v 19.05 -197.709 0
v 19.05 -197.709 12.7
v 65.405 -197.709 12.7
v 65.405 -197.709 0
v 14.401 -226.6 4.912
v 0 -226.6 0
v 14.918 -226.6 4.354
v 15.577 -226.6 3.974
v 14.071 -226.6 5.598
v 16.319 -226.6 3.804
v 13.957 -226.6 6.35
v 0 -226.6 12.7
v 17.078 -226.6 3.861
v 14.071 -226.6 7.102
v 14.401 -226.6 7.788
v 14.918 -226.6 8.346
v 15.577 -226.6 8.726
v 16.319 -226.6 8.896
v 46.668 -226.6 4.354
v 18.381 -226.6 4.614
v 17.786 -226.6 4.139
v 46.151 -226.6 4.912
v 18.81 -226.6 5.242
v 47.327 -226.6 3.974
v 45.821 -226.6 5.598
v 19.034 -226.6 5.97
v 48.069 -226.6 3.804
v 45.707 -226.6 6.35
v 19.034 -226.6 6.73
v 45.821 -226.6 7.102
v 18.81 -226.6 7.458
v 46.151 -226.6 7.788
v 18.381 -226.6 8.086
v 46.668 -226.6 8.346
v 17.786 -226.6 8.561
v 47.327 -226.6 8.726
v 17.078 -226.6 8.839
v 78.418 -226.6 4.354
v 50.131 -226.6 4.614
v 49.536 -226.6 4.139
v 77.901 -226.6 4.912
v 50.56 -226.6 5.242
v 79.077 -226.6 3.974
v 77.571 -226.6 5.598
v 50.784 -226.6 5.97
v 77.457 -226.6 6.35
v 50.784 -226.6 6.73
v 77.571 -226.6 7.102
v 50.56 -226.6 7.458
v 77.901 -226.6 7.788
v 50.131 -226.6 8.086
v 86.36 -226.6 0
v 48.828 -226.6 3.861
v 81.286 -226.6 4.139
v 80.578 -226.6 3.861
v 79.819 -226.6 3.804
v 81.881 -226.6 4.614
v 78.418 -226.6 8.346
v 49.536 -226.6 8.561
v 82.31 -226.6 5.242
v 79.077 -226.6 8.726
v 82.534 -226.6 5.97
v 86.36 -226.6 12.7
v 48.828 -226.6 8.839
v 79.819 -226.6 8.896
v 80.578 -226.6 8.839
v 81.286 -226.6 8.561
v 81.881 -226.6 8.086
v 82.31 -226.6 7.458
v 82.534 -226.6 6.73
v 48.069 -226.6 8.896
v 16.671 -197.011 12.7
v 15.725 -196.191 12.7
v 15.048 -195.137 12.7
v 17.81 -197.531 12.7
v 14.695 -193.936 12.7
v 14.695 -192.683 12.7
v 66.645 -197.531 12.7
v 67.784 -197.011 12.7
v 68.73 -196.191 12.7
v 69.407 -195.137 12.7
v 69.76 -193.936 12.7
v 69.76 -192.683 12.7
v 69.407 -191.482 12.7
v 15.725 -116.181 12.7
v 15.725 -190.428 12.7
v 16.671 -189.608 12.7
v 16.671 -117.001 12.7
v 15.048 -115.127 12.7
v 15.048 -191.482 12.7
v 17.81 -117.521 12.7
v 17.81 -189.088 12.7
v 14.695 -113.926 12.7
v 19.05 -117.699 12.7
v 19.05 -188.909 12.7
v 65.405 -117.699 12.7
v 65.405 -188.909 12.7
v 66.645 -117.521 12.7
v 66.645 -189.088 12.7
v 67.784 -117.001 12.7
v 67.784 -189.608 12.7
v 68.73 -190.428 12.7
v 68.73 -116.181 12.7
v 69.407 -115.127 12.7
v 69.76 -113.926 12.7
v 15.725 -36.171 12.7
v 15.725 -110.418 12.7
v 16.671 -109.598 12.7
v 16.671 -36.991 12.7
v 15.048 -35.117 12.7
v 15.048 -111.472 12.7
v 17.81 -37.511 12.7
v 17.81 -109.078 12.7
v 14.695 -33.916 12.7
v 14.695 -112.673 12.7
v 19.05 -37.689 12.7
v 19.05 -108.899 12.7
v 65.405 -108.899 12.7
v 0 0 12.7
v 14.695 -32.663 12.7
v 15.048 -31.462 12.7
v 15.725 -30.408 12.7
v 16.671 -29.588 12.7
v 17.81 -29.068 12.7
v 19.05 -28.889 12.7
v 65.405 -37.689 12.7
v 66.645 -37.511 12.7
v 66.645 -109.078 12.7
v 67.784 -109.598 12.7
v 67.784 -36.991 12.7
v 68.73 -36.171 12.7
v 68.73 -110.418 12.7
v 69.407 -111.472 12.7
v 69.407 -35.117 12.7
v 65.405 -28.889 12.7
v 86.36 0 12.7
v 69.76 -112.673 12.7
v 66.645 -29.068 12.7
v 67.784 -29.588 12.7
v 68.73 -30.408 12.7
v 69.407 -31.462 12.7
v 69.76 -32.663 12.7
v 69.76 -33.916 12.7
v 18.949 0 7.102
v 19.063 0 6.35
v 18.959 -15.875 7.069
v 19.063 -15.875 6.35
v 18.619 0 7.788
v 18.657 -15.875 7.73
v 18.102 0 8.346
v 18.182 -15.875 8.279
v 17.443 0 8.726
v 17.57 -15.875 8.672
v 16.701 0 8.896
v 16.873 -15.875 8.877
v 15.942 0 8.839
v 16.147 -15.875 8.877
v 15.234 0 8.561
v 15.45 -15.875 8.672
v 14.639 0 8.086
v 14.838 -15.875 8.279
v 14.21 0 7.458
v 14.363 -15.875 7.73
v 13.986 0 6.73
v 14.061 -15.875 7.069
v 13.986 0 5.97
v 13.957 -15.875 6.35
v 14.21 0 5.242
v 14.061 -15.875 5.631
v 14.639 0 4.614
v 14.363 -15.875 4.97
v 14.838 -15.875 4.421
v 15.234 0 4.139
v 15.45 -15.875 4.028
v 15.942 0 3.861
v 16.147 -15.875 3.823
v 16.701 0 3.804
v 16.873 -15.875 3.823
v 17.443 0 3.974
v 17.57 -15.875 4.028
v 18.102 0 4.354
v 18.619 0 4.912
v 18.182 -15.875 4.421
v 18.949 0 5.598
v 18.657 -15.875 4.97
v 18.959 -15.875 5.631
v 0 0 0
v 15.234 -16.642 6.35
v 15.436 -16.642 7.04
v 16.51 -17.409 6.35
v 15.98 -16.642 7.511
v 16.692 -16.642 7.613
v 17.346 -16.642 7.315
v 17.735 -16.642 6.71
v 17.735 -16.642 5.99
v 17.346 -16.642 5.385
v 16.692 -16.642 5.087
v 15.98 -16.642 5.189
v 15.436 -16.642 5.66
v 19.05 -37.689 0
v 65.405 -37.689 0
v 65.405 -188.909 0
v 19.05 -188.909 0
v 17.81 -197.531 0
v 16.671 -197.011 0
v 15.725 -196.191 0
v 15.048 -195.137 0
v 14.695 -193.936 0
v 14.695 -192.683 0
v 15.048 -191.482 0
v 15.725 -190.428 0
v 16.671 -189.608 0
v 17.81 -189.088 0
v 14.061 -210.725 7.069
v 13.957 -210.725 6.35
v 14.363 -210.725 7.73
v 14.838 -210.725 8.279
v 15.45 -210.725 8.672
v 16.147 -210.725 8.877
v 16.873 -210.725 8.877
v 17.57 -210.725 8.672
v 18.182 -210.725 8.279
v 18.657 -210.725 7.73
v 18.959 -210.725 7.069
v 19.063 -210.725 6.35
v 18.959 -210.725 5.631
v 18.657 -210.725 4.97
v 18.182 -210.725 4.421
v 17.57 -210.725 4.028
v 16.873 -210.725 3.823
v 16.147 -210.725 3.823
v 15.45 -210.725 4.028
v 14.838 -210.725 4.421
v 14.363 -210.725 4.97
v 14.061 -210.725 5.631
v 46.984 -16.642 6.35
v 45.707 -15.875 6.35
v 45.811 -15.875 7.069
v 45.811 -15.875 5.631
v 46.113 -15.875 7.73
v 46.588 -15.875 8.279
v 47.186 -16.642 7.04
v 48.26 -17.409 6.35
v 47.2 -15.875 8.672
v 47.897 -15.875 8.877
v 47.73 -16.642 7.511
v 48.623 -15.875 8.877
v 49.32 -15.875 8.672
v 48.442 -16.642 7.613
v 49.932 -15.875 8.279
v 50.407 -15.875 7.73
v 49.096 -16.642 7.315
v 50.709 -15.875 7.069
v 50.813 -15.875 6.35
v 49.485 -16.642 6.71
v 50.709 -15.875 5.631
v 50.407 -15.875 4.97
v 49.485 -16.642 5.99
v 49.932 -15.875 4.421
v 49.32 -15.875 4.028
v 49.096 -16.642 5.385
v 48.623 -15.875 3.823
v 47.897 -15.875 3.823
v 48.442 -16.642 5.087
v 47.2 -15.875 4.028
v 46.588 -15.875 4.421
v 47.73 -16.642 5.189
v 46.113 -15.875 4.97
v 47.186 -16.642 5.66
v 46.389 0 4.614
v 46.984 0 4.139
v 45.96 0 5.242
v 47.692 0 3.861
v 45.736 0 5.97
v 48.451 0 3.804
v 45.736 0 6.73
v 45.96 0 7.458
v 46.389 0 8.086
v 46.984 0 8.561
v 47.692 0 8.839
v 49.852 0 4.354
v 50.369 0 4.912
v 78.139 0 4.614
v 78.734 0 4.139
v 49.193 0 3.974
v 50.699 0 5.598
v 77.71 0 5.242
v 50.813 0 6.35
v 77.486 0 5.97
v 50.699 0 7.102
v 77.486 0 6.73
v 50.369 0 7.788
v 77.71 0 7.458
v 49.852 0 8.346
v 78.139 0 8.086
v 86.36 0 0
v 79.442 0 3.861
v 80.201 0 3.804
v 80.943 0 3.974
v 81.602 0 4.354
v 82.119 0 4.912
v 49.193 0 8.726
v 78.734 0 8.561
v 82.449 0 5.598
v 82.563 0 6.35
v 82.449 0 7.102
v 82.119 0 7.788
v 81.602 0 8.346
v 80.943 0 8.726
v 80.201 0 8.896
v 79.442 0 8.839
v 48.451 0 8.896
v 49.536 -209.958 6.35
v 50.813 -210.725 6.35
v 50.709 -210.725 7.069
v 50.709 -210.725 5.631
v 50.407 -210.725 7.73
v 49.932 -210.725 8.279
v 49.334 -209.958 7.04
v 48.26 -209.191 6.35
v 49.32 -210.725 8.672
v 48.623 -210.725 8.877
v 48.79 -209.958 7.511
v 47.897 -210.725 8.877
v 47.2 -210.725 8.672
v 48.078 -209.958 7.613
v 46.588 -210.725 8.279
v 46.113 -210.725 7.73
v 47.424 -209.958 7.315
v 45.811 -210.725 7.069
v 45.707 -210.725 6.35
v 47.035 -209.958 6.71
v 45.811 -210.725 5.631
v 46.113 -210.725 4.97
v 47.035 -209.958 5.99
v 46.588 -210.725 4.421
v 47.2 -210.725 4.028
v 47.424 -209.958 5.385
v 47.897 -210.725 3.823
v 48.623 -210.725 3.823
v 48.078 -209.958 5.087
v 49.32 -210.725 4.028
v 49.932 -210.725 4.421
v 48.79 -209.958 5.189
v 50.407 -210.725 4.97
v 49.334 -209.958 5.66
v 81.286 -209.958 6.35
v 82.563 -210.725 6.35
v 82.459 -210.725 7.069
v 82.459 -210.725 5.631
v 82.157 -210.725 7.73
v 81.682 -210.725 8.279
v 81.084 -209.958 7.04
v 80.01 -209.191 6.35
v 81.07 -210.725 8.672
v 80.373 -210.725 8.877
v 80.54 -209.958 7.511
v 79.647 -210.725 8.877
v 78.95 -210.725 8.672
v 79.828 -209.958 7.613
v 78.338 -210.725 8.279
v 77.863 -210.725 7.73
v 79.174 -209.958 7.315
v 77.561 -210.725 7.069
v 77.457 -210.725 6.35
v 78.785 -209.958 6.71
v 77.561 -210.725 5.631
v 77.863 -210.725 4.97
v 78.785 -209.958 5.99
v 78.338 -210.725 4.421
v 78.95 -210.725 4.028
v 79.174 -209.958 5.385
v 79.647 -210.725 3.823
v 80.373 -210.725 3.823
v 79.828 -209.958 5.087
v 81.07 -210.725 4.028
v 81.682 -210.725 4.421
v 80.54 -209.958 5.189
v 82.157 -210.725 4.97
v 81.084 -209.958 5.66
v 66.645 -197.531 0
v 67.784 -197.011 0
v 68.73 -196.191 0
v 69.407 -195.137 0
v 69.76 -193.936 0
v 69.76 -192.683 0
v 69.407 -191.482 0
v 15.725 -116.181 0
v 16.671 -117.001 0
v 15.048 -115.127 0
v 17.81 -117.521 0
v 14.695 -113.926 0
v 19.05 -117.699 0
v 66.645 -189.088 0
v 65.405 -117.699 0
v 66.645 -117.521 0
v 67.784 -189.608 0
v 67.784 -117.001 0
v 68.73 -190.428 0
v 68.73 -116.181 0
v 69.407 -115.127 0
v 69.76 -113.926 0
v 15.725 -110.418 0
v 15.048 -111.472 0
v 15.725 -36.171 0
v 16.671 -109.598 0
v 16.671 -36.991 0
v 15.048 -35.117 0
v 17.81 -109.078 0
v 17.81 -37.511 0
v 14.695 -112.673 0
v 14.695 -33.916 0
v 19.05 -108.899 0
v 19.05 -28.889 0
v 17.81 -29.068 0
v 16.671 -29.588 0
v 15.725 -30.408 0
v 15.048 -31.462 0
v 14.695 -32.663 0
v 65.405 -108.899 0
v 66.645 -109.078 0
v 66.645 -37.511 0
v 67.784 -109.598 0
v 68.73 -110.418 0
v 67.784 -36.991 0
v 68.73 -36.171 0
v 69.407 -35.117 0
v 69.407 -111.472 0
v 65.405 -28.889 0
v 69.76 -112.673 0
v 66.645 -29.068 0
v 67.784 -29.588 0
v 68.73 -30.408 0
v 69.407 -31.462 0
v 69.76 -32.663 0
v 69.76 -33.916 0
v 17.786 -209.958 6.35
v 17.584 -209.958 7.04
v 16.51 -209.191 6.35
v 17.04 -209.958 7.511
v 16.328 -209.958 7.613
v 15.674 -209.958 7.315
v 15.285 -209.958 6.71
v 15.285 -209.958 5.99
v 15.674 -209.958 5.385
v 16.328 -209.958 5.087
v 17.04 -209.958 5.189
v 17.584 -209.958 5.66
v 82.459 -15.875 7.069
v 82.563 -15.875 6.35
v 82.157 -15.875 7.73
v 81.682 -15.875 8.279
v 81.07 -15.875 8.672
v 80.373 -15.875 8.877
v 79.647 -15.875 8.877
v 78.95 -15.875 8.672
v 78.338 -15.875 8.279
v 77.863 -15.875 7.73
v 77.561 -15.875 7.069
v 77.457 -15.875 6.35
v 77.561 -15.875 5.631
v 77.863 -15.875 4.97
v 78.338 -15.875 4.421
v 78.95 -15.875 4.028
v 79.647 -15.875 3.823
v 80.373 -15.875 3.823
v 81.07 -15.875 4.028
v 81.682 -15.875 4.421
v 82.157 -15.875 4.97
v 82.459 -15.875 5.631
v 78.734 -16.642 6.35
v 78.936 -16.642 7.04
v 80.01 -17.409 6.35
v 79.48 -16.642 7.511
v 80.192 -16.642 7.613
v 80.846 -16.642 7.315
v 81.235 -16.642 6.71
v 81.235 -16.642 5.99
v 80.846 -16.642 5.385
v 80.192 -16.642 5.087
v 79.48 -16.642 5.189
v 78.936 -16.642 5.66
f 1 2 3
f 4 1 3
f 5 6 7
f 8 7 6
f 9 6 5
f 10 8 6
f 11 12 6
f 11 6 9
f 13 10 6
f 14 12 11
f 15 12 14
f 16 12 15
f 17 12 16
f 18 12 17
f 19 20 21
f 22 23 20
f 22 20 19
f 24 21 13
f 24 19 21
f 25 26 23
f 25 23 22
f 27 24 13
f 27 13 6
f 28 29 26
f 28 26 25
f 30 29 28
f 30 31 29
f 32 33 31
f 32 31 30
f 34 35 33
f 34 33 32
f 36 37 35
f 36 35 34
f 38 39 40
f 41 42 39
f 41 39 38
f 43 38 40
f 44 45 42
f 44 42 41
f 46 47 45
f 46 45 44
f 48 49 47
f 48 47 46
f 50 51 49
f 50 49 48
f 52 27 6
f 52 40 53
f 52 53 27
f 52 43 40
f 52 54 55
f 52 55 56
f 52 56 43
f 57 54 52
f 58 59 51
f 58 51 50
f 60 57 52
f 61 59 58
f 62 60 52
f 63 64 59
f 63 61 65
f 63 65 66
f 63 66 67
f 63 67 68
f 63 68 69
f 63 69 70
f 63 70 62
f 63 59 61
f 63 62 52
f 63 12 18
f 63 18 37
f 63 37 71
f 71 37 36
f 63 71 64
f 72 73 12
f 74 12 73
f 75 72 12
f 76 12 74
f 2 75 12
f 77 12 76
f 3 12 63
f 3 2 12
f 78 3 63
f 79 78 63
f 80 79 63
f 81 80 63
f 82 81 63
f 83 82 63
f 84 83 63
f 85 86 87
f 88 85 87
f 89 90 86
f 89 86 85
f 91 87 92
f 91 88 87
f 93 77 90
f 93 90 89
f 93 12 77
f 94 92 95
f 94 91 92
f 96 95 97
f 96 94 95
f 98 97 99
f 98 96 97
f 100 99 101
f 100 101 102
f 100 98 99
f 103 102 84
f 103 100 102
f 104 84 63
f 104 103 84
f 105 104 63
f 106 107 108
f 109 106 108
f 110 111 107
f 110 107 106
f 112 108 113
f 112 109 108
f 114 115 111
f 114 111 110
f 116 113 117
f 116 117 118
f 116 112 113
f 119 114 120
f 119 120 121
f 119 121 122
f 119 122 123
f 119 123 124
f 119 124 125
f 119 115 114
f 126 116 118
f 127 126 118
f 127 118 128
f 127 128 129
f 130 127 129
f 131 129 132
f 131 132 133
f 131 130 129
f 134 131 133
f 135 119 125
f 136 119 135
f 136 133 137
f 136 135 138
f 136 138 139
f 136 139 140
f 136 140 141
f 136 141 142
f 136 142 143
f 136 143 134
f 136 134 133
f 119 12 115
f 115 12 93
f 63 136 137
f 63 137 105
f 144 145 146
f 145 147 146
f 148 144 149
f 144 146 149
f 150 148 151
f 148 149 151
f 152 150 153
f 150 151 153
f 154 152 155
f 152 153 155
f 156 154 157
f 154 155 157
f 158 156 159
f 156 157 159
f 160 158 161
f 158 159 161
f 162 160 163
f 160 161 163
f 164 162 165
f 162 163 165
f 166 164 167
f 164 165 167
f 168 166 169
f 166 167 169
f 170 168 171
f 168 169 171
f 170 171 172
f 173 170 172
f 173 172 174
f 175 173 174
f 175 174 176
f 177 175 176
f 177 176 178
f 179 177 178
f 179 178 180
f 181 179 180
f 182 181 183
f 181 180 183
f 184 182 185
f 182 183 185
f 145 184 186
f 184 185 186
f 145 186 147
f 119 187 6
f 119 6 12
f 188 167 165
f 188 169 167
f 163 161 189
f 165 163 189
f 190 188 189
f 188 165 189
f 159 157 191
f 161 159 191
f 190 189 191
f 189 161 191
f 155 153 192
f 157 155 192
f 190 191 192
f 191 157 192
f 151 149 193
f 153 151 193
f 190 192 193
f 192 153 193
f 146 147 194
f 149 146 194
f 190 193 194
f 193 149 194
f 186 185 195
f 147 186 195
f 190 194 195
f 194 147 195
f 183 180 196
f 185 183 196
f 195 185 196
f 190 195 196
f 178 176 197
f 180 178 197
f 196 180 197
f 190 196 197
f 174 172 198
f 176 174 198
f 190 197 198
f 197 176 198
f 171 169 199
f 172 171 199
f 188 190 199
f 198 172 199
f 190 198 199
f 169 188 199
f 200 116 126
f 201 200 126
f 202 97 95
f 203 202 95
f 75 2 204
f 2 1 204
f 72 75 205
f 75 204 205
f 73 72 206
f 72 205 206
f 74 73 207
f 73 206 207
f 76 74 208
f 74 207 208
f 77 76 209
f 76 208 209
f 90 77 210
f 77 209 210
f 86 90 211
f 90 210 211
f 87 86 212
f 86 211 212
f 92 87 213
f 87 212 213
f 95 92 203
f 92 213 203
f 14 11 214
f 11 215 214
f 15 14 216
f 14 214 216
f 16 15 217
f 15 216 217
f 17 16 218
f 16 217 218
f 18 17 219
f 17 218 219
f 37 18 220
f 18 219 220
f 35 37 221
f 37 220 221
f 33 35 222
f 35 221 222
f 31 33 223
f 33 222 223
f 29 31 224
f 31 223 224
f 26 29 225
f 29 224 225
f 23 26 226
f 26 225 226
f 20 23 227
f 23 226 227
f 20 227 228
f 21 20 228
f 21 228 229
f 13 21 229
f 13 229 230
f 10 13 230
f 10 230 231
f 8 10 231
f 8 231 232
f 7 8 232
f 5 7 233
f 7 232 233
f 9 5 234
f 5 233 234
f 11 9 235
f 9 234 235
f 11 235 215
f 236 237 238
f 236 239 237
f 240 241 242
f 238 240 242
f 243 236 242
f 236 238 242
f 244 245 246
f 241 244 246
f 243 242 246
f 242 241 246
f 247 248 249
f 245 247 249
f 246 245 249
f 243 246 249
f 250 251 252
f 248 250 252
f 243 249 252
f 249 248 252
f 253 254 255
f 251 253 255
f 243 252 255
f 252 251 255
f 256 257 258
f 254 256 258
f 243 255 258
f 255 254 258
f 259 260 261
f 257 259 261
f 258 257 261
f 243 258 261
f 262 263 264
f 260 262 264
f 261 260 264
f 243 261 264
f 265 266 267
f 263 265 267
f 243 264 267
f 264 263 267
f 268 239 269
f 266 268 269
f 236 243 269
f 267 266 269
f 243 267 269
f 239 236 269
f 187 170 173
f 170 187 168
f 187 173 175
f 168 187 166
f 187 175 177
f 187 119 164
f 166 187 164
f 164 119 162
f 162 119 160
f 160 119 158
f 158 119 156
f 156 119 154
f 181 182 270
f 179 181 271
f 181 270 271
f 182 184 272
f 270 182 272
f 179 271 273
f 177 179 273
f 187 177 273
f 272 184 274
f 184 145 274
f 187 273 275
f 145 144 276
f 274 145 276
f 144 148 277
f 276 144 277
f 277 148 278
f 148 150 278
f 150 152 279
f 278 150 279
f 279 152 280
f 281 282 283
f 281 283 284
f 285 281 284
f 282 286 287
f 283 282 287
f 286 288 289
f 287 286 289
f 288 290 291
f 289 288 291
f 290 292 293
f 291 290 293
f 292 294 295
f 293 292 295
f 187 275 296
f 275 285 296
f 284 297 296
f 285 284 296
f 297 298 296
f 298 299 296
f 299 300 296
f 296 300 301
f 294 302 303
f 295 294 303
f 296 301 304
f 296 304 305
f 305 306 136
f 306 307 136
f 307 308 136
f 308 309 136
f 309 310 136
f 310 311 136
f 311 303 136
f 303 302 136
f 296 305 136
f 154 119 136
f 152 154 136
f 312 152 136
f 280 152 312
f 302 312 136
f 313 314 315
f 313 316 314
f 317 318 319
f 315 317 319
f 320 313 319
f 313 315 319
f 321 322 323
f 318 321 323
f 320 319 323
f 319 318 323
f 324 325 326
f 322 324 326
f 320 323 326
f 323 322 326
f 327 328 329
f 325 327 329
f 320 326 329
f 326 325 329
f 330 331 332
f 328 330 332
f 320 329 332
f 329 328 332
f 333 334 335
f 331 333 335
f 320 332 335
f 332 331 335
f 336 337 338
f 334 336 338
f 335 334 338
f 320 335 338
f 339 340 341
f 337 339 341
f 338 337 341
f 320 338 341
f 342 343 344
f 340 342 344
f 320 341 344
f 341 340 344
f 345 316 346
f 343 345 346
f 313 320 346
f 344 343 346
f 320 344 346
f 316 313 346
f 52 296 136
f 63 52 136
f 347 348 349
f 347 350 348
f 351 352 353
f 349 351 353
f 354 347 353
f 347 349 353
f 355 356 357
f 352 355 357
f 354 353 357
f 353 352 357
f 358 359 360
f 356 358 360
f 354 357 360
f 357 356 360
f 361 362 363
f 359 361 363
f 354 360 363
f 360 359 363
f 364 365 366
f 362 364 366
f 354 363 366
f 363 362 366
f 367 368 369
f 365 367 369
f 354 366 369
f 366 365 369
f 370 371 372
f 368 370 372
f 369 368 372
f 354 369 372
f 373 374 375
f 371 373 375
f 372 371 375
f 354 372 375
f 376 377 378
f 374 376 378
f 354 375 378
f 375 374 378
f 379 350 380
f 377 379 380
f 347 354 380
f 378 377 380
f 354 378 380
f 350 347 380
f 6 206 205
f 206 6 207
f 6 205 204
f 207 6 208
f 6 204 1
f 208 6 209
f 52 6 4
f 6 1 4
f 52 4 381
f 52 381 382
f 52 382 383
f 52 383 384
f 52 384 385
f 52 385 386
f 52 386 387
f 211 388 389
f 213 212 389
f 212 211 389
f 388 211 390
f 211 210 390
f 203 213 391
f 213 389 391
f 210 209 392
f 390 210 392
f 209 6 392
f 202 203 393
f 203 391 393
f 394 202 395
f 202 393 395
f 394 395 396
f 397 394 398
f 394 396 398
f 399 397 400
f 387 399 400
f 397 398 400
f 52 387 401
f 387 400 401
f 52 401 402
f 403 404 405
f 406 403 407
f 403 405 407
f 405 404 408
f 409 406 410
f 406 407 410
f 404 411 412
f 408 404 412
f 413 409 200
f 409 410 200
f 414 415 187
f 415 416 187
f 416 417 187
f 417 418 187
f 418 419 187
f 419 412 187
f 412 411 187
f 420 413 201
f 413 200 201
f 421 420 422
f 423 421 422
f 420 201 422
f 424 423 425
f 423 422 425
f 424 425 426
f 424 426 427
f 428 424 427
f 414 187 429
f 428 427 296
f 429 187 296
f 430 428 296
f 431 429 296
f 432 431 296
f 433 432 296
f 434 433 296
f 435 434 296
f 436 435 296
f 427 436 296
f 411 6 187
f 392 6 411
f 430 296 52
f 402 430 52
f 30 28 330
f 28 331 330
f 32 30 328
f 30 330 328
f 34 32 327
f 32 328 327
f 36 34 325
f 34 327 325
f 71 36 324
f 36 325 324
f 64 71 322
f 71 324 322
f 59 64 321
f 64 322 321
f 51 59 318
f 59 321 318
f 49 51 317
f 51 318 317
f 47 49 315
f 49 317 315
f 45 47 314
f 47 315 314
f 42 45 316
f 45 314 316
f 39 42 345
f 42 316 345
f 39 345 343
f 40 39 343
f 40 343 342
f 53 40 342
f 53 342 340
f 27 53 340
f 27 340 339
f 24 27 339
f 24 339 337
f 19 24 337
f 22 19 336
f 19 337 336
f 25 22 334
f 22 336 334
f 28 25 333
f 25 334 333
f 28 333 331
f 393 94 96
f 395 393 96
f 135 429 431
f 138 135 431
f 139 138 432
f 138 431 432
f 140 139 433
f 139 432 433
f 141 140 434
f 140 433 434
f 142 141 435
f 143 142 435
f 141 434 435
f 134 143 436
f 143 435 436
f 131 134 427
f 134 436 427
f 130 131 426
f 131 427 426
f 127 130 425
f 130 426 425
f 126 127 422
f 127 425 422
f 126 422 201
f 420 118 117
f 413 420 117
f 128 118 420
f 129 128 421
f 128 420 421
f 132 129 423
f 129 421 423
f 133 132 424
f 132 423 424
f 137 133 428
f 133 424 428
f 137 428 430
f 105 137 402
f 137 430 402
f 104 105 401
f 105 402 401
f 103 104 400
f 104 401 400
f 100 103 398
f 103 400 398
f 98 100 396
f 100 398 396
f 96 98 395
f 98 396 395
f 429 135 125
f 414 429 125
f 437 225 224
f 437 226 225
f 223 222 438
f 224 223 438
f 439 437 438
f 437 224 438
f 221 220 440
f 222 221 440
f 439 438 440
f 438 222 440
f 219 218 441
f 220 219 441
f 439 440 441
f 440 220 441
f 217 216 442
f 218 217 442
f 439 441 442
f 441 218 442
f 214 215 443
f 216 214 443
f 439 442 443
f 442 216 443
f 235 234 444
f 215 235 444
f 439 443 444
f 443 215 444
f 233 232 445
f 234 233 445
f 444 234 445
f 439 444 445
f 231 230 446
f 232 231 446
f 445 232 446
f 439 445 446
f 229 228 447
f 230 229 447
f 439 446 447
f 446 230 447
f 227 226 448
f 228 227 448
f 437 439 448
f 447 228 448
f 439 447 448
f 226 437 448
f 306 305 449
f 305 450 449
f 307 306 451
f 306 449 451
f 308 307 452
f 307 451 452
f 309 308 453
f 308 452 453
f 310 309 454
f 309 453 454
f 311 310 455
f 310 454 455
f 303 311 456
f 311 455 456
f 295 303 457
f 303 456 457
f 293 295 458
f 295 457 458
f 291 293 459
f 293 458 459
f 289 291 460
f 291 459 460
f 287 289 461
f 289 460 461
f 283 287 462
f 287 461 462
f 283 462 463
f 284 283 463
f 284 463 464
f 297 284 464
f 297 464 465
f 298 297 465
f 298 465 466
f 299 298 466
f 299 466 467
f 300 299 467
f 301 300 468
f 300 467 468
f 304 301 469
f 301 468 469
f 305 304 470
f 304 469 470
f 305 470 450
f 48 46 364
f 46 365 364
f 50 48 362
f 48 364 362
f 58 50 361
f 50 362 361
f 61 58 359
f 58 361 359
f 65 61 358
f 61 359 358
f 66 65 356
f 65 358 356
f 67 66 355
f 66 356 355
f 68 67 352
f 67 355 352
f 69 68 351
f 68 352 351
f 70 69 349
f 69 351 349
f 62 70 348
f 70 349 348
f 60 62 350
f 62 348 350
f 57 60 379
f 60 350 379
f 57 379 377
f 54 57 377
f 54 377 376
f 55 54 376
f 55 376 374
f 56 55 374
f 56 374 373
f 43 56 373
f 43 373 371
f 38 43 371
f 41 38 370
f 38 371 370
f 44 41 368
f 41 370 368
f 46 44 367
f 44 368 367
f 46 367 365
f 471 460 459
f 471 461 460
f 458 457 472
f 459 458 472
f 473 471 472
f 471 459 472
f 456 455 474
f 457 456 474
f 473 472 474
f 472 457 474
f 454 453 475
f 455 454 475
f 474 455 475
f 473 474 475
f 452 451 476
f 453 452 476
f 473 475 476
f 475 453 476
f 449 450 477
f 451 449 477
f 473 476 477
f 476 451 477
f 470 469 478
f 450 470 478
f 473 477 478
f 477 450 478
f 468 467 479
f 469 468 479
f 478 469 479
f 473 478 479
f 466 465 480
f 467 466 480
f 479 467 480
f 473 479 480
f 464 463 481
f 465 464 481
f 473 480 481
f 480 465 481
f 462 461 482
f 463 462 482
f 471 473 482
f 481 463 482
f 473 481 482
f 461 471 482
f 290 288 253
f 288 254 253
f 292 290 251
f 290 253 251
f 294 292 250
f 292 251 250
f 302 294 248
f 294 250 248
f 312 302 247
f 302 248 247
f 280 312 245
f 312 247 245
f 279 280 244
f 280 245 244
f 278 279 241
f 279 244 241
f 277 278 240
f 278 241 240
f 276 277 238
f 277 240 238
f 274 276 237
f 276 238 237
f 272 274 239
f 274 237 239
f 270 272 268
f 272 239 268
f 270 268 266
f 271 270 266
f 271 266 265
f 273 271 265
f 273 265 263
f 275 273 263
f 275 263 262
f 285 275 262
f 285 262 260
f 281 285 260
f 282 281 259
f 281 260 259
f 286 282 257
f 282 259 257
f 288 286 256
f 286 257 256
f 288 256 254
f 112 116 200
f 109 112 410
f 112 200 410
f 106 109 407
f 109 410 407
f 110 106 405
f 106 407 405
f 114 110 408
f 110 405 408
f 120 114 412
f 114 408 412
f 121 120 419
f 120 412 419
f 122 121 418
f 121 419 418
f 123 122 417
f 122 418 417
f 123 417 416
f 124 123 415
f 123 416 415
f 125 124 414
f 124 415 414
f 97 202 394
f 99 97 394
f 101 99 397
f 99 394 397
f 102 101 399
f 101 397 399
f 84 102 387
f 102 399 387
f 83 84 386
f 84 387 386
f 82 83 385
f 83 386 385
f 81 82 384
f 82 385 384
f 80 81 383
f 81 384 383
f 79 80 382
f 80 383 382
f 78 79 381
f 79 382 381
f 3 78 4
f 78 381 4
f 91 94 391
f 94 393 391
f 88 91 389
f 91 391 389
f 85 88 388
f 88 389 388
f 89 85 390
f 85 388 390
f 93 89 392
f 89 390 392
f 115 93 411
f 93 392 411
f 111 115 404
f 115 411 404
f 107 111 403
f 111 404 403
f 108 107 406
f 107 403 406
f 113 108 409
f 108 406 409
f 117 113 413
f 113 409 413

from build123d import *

# Parameters (mm, degrees)
F0_W     = 86.36
F0_H     = 12.7
F1_DEPTH = 226.6
F3_D     = 8.8
F6_D     = 5.1054
F6_DEPTH = 15.875
F6_TIP   = 1.5338169022
F8_D     = 5.1054
F8_DEPTH = 15.875
F8_TIP   = 1.5338169022
F9_DEPTH = 25.4


# Not quite as in the source:
# - a feature names something its author has since deleted; it is built from what else it names


with BuildPart() as f1:
    # F0 (on Front) → F1 (new body)
    with BuildSketch(Plane.XZ):
        with Locations((43.18, 6.35)):
            Rectangle(F0_W, F0_H)
    extrude(amount=F1_DEPTH)

    # F3 (through all)
    with Locations(Plane.XY.offset(12.7)):
        with Locations((19.05, -113.29949), (65.405, -113.29949), (65.405, -33.28949), (19.05, -193.30949), (65.405, -193.30949), (19.05, -33.28949)):
            Hole(F3_D / 2)

    # F6
    with Locations(Plane.XZ.offset(226.6)):
        with Locations((16.51, 6.35), (48.26, 6.35), (80.01, 6.35)):
            Hole(F6_D / 2, depth=F6_DEPTH)
            with Locations((0, 0, -(F6_DEPTH + F6_TIP / 2))):  # 118° drill point
                Cone(0, F6_D / 2, F6_TIP, mode=Mode.SUBTRACT)

    # F8
    with Locations(Plane(origin=(0, 0, 0), x_dir=(-1, 0, 0), z_dir=(0, 1, 0))):
        with Locations((-80.01, 6.35), (-48.26, 6.35), (-16.51, 6.35)):
            Hole(F8_D / 2, depth=F8_DEPTH)
            with Locations((0, 0, -(F8_DEPTH + F8_TIP / 2))):  # 118° drill point
                Cone(0, F8_D / 2, F8_TIP, mode=Mode.SUBTRACT)

    # F4 (on face) → F9 (cut)
    with BuildSketch(Plane.XY.offset(12.7)):
        with BuildLine():
            ThreePointArc((23.45, -193.30949), (22.1612698372, -196.4207598372), (19.05, -197.70949))
            Line((19.05, -197.70949), (65.405, -197.70949))
            ThreePointArc((65.405, -197.70949), (61.005, -193.30949), (65.405, -188.90949))
            Line((65.405, -188.90949), (19.05, -188.90949))
            ThreePointArc((19.05, -188.90949), (22.1612698372, -190.1982201628), (23.45, -193.30949))
        make_face()
        with BuildLine():
            ThreePointArc((65.405, -117.69949), (61.005, -113.29949), (65.405, -108.89949))
            Line((65.405, -108.89949), (19.05, -108.89949))
            ThreePointArc((19.05, -108.89949), (22.1612698372, -110.1882201628), (23.45, -113.29949))
            ThreePointArc((23.45, -113.29949), (22.1612698372, -116.4107598372), (19.05, -117.69949))
            Line((19.05, -117.69949), (65.405, -117.69949))
        make_face()
        with BuildLine():
            ThreePointArc((65.405, -37.68949), (61.005, -33.28949), (65.405, -28.88949))
            Line((65.405, -28.88949), (19.05, -28.88949))
            ThreePointArc((19.05, -28.88949), (22.1612698372, -30.1782201628), (23.45, -33.28949))
            ThreePointArc((23.45, -33.28949), (22.1612698372, -36.4007598372), (19.05, -37.68949))
            Line((19.05, -37.68949), (65.405, -37.68949))
        make_face()
    extrude(amount=-F9_DEPTH, mode=Mode.SUBTRACT)


solid = f1.part
